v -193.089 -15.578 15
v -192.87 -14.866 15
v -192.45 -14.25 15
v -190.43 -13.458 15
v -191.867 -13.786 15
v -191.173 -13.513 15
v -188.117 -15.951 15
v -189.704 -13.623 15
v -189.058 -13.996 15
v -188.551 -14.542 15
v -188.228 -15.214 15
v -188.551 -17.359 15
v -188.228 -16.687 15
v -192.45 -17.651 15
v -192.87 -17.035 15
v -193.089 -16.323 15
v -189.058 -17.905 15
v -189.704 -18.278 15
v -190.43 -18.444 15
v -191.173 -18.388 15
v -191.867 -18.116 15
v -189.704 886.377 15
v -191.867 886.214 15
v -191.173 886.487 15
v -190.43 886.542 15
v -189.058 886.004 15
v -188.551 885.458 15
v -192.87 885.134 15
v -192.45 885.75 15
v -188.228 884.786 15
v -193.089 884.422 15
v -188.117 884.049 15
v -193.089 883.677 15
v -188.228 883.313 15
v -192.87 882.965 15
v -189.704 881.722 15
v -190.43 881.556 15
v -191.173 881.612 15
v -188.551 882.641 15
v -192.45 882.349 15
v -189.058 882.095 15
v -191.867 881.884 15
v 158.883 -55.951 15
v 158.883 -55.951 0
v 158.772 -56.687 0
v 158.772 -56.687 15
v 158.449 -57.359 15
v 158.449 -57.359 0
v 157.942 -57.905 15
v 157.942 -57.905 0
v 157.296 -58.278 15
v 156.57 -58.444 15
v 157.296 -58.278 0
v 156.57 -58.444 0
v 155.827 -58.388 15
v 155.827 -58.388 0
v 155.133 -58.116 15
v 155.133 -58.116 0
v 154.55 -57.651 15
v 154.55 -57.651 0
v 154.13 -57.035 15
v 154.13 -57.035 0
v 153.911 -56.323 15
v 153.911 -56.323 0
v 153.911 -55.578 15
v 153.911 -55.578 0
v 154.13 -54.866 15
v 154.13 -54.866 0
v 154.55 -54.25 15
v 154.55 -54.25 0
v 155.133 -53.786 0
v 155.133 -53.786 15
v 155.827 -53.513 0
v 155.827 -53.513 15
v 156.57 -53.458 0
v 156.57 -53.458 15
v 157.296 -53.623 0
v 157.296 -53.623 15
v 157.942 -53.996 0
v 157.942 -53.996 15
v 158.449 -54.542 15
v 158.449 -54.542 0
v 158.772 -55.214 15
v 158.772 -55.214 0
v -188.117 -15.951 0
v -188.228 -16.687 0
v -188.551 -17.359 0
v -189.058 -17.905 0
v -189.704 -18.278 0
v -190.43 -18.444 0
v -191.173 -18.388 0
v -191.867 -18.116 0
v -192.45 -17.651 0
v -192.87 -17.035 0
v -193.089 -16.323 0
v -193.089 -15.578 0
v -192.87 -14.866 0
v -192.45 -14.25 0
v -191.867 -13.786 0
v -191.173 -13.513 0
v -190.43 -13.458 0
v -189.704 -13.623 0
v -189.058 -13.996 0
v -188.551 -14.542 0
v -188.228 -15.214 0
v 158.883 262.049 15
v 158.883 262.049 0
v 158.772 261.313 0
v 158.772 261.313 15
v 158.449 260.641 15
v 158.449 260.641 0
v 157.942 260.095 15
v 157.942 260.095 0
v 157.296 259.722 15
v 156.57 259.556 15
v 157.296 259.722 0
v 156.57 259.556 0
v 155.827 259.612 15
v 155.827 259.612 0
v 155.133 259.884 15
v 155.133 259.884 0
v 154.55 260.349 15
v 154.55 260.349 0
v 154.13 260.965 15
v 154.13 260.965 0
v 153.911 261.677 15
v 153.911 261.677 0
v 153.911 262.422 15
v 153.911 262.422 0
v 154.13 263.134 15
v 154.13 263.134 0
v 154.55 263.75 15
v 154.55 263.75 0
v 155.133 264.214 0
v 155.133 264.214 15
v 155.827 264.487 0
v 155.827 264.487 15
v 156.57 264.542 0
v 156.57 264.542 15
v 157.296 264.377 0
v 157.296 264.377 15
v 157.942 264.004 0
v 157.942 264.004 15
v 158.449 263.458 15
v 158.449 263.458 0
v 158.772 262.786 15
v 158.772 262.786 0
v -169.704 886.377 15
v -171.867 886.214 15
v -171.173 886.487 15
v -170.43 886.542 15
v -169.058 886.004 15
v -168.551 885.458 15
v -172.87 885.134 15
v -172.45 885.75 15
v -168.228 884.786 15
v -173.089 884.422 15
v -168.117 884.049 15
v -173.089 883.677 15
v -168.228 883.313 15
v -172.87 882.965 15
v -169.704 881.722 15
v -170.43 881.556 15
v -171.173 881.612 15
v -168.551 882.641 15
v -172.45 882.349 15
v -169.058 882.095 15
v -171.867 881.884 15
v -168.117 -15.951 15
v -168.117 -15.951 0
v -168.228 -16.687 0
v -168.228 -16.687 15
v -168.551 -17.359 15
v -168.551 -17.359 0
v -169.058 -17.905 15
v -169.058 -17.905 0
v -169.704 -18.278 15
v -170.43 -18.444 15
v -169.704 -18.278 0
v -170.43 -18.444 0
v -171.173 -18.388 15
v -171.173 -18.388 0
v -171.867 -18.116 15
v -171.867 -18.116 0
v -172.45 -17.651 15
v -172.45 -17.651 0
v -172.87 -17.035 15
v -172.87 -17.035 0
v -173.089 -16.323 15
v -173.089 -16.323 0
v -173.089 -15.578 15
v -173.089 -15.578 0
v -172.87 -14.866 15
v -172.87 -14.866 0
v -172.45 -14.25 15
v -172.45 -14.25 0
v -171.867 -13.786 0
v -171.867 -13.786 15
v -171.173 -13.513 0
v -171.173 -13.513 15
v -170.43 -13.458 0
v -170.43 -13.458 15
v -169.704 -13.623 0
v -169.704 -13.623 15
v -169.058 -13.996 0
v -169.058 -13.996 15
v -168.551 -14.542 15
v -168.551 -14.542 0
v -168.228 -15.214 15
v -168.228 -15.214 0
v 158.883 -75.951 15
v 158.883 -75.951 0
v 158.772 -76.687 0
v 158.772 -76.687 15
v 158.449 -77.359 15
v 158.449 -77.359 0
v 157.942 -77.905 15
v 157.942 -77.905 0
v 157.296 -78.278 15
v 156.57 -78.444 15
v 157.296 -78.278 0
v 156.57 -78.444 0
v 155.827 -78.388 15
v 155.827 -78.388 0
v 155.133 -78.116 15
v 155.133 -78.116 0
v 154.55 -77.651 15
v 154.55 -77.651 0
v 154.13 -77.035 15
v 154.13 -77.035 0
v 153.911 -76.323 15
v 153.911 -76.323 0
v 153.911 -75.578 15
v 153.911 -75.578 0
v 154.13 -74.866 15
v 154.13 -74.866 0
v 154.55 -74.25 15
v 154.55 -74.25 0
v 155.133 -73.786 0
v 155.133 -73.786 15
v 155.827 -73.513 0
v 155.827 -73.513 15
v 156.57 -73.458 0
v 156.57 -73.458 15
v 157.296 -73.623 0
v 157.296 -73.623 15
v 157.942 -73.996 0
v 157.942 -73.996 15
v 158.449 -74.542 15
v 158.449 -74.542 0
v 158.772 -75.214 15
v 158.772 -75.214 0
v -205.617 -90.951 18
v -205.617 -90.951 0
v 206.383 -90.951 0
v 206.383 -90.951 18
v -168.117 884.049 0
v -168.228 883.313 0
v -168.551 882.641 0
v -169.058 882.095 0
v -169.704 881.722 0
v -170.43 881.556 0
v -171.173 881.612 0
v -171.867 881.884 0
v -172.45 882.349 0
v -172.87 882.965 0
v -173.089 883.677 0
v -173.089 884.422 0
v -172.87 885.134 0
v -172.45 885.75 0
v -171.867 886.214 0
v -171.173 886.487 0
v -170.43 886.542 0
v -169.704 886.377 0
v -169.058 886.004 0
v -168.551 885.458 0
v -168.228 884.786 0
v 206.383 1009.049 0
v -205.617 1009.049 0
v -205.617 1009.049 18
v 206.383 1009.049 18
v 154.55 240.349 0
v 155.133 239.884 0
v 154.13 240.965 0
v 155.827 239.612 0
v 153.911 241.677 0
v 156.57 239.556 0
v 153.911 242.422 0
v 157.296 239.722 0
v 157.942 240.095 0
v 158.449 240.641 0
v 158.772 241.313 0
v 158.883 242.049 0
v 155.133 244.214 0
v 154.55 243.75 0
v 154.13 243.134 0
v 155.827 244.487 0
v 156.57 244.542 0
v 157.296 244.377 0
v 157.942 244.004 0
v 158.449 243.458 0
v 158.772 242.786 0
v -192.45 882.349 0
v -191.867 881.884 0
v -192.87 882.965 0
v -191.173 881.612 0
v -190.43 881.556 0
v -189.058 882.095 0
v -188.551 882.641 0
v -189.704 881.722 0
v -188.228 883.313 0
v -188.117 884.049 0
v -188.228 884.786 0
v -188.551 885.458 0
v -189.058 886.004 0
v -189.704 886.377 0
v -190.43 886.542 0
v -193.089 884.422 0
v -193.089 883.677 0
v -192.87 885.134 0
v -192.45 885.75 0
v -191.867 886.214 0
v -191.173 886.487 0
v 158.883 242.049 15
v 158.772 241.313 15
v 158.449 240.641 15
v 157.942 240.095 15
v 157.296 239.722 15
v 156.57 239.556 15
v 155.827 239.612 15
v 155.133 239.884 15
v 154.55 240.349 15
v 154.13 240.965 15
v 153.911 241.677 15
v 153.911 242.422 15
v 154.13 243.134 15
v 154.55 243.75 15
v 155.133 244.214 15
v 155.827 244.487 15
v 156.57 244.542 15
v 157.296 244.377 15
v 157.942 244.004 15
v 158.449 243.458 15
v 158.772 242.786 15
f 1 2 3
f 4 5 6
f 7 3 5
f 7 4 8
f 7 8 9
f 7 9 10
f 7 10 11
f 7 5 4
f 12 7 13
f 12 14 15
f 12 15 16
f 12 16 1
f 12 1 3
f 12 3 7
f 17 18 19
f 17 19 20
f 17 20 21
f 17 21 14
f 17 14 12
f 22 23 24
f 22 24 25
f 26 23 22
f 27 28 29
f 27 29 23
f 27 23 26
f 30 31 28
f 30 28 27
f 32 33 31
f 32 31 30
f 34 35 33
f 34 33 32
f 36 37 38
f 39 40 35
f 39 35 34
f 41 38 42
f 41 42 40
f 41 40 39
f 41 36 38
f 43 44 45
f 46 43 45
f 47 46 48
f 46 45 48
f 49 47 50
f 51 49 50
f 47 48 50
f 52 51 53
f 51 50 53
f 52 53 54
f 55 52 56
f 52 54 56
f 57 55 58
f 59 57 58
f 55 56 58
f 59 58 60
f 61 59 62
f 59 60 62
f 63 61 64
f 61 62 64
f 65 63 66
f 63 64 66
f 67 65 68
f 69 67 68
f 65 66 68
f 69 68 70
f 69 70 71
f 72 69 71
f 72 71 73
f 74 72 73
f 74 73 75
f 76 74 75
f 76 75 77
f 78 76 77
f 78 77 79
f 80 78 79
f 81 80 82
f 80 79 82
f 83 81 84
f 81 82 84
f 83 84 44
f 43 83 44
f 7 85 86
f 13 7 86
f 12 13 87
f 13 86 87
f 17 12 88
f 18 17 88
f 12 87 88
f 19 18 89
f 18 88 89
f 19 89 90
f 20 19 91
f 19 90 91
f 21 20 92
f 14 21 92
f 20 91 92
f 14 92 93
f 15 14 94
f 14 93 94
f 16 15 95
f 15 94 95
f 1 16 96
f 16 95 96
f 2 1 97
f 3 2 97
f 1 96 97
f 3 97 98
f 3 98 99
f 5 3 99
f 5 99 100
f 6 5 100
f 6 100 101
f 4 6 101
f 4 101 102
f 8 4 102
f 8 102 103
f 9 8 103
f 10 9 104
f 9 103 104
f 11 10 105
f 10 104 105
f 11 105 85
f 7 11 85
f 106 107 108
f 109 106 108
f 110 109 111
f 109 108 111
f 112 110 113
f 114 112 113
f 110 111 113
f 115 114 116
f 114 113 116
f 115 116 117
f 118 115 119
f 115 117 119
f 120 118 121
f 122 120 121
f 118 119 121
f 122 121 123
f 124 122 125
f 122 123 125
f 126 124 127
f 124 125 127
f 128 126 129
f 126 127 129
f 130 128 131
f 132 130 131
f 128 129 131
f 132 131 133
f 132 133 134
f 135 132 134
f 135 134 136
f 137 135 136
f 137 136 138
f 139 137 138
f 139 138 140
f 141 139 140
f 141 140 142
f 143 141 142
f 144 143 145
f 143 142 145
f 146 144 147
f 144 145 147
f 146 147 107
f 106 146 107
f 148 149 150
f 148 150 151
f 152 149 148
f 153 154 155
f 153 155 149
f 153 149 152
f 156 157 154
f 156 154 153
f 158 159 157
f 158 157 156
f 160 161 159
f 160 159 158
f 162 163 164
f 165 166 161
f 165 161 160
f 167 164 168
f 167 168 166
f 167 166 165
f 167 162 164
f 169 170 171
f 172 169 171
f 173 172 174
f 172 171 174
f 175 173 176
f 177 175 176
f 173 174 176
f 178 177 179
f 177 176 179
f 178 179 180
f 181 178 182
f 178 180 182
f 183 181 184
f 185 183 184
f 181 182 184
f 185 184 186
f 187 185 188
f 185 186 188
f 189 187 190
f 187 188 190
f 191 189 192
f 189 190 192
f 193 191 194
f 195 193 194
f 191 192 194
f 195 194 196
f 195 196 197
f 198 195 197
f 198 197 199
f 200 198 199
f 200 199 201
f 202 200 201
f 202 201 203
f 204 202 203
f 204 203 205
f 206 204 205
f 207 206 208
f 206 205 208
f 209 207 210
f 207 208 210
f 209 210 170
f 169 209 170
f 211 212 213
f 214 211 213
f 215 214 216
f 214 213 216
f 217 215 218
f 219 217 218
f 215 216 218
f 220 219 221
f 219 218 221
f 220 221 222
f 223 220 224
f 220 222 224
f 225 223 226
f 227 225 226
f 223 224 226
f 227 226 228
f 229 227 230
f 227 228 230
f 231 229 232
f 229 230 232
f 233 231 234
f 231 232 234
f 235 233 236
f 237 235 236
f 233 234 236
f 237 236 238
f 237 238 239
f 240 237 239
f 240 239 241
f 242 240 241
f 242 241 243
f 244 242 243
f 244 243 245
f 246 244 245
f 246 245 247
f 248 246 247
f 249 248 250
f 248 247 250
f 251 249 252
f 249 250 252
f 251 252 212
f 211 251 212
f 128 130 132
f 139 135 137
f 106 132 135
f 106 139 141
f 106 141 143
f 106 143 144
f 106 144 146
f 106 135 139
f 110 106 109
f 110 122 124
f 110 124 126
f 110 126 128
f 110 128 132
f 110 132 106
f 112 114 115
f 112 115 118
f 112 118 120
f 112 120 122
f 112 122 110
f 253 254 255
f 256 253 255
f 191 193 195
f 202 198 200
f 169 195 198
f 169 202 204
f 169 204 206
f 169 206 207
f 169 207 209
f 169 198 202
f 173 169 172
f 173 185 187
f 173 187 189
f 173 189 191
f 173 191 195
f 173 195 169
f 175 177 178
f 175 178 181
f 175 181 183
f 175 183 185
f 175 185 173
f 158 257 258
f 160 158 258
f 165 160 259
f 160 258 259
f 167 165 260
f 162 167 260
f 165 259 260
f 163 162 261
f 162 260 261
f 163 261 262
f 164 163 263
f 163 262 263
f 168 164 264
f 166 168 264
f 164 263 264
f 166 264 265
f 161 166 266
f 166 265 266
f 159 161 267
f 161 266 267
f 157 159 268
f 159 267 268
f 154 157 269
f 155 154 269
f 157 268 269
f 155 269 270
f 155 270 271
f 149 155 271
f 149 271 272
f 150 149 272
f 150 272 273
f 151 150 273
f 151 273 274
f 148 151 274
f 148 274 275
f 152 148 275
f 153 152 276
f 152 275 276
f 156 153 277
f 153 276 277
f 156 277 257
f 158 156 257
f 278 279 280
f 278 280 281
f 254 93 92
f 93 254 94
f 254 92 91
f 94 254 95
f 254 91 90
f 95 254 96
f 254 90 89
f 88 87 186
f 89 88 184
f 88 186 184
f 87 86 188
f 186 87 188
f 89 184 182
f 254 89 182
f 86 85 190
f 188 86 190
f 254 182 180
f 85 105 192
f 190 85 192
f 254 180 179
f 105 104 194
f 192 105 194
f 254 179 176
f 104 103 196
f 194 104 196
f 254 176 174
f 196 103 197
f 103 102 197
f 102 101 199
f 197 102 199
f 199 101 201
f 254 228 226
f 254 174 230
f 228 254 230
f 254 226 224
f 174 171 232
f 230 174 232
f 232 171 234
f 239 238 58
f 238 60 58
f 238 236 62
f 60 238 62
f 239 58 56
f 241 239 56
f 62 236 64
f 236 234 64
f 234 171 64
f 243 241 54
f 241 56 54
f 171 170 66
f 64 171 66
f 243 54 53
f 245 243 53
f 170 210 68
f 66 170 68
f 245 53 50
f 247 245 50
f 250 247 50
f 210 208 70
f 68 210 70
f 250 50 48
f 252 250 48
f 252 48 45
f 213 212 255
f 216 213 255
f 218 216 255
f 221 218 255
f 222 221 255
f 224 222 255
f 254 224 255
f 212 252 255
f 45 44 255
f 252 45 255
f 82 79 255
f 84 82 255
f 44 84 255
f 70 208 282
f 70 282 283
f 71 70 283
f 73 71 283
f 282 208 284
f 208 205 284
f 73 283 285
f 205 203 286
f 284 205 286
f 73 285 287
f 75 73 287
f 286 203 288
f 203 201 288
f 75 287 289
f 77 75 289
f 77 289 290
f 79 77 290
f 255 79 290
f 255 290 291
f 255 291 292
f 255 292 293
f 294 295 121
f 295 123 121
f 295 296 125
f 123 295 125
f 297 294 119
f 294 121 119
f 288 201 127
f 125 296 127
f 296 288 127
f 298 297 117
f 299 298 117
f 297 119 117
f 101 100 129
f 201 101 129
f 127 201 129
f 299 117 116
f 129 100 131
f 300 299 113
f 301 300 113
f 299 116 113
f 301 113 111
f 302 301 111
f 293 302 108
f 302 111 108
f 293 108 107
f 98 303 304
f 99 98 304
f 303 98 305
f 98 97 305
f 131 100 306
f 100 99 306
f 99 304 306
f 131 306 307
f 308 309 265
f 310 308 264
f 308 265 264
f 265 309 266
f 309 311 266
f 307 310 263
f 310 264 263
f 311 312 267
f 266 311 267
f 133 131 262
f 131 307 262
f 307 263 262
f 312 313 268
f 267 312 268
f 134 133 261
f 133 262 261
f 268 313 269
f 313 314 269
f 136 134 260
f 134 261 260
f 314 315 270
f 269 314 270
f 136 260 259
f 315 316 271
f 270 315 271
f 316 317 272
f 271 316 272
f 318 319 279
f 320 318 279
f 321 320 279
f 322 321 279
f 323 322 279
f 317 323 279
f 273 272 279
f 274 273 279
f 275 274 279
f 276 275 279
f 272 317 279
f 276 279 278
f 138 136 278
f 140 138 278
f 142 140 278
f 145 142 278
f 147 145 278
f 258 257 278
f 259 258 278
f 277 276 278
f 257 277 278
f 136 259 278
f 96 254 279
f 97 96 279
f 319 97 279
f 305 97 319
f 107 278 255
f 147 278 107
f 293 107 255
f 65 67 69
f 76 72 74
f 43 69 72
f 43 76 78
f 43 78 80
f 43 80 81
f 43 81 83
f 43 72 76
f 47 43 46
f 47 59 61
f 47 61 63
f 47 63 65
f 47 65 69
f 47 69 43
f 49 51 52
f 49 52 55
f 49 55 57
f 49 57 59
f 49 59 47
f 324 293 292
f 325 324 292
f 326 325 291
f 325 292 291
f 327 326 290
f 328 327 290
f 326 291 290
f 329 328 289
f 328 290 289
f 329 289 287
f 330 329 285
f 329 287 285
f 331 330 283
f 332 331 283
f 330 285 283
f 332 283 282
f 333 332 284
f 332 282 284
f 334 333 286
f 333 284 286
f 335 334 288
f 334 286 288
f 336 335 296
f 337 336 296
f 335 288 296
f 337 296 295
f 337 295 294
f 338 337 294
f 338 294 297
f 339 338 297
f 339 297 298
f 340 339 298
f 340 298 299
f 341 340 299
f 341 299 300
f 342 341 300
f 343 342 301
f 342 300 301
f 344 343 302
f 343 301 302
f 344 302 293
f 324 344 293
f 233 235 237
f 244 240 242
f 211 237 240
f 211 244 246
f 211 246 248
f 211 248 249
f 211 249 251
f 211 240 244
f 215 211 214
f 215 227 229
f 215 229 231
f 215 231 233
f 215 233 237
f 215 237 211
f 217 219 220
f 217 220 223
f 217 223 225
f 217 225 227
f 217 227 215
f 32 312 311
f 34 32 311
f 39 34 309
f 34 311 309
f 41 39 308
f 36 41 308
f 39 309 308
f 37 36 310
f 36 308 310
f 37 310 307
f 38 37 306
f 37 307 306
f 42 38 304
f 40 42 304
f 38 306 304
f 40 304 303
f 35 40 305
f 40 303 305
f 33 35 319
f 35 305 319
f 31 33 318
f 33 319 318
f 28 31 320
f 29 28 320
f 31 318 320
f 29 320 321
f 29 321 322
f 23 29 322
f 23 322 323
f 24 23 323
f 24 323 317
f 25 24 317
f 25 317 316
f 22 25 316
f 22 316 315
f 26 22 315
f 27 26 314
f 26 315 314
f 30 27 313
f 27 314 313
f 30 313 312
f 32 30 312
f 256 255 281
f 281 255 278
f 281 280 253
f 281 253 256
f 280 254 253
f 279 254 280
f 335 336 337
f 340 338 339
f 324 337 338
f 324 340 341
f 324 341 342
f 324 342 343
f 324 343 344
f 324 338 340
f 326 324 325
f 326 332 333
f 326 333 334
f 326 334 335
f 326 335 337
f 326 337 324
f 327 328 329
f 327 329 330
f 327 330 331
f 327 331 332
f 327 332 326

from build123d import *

# Parameters (mm, degrees)
F0_W     = 412
F0_H     = 1100
F1_DEPTH = 18
F2_R     = 2.5
F3_DEPTH = 15


with BuildPart() as f1:
    # F0 (on Top) → F1 (new body)
    with BuildSketch(Plane.XY):
        with Locations((0.382904, 459.049425)):
            Rectangle(F0_W, F0_H)
    extrude(amount=F1_DEPTH)

    # F2 (on face) → F3 (cut)
    with BuildSketch(Plane(origin=(0, 0, 0), x_dir=(1, 0, 0), z_dir=(0, 0, -1))):
        with Locations((-190.617096, -884.049425)):
            Circle(F2_R)
        with Locations((-170.617096, -884.049425)):
            Circle(F2_R)
        with Locations((156.382904, -262.049425)):
            Circle(F2_R)
        with Locations((156.382904, -242.049425)):
            Circle(F2_R)
        with Locations((156.382904, 55.950575)):
            Circle(F2_R)
        with Locations((156.382904, 75.950575)):
            Circle(F2_R)
        with Locations((-170.617096, 15.950575)):
            Circle(F2_R)
        with Locations((-190.617096, 15.950575)):
            Circle(F2_R)
    extrude(amount=-F3_DEPTH, mode=Mode.SUBTRACT)


solid = f1.part
